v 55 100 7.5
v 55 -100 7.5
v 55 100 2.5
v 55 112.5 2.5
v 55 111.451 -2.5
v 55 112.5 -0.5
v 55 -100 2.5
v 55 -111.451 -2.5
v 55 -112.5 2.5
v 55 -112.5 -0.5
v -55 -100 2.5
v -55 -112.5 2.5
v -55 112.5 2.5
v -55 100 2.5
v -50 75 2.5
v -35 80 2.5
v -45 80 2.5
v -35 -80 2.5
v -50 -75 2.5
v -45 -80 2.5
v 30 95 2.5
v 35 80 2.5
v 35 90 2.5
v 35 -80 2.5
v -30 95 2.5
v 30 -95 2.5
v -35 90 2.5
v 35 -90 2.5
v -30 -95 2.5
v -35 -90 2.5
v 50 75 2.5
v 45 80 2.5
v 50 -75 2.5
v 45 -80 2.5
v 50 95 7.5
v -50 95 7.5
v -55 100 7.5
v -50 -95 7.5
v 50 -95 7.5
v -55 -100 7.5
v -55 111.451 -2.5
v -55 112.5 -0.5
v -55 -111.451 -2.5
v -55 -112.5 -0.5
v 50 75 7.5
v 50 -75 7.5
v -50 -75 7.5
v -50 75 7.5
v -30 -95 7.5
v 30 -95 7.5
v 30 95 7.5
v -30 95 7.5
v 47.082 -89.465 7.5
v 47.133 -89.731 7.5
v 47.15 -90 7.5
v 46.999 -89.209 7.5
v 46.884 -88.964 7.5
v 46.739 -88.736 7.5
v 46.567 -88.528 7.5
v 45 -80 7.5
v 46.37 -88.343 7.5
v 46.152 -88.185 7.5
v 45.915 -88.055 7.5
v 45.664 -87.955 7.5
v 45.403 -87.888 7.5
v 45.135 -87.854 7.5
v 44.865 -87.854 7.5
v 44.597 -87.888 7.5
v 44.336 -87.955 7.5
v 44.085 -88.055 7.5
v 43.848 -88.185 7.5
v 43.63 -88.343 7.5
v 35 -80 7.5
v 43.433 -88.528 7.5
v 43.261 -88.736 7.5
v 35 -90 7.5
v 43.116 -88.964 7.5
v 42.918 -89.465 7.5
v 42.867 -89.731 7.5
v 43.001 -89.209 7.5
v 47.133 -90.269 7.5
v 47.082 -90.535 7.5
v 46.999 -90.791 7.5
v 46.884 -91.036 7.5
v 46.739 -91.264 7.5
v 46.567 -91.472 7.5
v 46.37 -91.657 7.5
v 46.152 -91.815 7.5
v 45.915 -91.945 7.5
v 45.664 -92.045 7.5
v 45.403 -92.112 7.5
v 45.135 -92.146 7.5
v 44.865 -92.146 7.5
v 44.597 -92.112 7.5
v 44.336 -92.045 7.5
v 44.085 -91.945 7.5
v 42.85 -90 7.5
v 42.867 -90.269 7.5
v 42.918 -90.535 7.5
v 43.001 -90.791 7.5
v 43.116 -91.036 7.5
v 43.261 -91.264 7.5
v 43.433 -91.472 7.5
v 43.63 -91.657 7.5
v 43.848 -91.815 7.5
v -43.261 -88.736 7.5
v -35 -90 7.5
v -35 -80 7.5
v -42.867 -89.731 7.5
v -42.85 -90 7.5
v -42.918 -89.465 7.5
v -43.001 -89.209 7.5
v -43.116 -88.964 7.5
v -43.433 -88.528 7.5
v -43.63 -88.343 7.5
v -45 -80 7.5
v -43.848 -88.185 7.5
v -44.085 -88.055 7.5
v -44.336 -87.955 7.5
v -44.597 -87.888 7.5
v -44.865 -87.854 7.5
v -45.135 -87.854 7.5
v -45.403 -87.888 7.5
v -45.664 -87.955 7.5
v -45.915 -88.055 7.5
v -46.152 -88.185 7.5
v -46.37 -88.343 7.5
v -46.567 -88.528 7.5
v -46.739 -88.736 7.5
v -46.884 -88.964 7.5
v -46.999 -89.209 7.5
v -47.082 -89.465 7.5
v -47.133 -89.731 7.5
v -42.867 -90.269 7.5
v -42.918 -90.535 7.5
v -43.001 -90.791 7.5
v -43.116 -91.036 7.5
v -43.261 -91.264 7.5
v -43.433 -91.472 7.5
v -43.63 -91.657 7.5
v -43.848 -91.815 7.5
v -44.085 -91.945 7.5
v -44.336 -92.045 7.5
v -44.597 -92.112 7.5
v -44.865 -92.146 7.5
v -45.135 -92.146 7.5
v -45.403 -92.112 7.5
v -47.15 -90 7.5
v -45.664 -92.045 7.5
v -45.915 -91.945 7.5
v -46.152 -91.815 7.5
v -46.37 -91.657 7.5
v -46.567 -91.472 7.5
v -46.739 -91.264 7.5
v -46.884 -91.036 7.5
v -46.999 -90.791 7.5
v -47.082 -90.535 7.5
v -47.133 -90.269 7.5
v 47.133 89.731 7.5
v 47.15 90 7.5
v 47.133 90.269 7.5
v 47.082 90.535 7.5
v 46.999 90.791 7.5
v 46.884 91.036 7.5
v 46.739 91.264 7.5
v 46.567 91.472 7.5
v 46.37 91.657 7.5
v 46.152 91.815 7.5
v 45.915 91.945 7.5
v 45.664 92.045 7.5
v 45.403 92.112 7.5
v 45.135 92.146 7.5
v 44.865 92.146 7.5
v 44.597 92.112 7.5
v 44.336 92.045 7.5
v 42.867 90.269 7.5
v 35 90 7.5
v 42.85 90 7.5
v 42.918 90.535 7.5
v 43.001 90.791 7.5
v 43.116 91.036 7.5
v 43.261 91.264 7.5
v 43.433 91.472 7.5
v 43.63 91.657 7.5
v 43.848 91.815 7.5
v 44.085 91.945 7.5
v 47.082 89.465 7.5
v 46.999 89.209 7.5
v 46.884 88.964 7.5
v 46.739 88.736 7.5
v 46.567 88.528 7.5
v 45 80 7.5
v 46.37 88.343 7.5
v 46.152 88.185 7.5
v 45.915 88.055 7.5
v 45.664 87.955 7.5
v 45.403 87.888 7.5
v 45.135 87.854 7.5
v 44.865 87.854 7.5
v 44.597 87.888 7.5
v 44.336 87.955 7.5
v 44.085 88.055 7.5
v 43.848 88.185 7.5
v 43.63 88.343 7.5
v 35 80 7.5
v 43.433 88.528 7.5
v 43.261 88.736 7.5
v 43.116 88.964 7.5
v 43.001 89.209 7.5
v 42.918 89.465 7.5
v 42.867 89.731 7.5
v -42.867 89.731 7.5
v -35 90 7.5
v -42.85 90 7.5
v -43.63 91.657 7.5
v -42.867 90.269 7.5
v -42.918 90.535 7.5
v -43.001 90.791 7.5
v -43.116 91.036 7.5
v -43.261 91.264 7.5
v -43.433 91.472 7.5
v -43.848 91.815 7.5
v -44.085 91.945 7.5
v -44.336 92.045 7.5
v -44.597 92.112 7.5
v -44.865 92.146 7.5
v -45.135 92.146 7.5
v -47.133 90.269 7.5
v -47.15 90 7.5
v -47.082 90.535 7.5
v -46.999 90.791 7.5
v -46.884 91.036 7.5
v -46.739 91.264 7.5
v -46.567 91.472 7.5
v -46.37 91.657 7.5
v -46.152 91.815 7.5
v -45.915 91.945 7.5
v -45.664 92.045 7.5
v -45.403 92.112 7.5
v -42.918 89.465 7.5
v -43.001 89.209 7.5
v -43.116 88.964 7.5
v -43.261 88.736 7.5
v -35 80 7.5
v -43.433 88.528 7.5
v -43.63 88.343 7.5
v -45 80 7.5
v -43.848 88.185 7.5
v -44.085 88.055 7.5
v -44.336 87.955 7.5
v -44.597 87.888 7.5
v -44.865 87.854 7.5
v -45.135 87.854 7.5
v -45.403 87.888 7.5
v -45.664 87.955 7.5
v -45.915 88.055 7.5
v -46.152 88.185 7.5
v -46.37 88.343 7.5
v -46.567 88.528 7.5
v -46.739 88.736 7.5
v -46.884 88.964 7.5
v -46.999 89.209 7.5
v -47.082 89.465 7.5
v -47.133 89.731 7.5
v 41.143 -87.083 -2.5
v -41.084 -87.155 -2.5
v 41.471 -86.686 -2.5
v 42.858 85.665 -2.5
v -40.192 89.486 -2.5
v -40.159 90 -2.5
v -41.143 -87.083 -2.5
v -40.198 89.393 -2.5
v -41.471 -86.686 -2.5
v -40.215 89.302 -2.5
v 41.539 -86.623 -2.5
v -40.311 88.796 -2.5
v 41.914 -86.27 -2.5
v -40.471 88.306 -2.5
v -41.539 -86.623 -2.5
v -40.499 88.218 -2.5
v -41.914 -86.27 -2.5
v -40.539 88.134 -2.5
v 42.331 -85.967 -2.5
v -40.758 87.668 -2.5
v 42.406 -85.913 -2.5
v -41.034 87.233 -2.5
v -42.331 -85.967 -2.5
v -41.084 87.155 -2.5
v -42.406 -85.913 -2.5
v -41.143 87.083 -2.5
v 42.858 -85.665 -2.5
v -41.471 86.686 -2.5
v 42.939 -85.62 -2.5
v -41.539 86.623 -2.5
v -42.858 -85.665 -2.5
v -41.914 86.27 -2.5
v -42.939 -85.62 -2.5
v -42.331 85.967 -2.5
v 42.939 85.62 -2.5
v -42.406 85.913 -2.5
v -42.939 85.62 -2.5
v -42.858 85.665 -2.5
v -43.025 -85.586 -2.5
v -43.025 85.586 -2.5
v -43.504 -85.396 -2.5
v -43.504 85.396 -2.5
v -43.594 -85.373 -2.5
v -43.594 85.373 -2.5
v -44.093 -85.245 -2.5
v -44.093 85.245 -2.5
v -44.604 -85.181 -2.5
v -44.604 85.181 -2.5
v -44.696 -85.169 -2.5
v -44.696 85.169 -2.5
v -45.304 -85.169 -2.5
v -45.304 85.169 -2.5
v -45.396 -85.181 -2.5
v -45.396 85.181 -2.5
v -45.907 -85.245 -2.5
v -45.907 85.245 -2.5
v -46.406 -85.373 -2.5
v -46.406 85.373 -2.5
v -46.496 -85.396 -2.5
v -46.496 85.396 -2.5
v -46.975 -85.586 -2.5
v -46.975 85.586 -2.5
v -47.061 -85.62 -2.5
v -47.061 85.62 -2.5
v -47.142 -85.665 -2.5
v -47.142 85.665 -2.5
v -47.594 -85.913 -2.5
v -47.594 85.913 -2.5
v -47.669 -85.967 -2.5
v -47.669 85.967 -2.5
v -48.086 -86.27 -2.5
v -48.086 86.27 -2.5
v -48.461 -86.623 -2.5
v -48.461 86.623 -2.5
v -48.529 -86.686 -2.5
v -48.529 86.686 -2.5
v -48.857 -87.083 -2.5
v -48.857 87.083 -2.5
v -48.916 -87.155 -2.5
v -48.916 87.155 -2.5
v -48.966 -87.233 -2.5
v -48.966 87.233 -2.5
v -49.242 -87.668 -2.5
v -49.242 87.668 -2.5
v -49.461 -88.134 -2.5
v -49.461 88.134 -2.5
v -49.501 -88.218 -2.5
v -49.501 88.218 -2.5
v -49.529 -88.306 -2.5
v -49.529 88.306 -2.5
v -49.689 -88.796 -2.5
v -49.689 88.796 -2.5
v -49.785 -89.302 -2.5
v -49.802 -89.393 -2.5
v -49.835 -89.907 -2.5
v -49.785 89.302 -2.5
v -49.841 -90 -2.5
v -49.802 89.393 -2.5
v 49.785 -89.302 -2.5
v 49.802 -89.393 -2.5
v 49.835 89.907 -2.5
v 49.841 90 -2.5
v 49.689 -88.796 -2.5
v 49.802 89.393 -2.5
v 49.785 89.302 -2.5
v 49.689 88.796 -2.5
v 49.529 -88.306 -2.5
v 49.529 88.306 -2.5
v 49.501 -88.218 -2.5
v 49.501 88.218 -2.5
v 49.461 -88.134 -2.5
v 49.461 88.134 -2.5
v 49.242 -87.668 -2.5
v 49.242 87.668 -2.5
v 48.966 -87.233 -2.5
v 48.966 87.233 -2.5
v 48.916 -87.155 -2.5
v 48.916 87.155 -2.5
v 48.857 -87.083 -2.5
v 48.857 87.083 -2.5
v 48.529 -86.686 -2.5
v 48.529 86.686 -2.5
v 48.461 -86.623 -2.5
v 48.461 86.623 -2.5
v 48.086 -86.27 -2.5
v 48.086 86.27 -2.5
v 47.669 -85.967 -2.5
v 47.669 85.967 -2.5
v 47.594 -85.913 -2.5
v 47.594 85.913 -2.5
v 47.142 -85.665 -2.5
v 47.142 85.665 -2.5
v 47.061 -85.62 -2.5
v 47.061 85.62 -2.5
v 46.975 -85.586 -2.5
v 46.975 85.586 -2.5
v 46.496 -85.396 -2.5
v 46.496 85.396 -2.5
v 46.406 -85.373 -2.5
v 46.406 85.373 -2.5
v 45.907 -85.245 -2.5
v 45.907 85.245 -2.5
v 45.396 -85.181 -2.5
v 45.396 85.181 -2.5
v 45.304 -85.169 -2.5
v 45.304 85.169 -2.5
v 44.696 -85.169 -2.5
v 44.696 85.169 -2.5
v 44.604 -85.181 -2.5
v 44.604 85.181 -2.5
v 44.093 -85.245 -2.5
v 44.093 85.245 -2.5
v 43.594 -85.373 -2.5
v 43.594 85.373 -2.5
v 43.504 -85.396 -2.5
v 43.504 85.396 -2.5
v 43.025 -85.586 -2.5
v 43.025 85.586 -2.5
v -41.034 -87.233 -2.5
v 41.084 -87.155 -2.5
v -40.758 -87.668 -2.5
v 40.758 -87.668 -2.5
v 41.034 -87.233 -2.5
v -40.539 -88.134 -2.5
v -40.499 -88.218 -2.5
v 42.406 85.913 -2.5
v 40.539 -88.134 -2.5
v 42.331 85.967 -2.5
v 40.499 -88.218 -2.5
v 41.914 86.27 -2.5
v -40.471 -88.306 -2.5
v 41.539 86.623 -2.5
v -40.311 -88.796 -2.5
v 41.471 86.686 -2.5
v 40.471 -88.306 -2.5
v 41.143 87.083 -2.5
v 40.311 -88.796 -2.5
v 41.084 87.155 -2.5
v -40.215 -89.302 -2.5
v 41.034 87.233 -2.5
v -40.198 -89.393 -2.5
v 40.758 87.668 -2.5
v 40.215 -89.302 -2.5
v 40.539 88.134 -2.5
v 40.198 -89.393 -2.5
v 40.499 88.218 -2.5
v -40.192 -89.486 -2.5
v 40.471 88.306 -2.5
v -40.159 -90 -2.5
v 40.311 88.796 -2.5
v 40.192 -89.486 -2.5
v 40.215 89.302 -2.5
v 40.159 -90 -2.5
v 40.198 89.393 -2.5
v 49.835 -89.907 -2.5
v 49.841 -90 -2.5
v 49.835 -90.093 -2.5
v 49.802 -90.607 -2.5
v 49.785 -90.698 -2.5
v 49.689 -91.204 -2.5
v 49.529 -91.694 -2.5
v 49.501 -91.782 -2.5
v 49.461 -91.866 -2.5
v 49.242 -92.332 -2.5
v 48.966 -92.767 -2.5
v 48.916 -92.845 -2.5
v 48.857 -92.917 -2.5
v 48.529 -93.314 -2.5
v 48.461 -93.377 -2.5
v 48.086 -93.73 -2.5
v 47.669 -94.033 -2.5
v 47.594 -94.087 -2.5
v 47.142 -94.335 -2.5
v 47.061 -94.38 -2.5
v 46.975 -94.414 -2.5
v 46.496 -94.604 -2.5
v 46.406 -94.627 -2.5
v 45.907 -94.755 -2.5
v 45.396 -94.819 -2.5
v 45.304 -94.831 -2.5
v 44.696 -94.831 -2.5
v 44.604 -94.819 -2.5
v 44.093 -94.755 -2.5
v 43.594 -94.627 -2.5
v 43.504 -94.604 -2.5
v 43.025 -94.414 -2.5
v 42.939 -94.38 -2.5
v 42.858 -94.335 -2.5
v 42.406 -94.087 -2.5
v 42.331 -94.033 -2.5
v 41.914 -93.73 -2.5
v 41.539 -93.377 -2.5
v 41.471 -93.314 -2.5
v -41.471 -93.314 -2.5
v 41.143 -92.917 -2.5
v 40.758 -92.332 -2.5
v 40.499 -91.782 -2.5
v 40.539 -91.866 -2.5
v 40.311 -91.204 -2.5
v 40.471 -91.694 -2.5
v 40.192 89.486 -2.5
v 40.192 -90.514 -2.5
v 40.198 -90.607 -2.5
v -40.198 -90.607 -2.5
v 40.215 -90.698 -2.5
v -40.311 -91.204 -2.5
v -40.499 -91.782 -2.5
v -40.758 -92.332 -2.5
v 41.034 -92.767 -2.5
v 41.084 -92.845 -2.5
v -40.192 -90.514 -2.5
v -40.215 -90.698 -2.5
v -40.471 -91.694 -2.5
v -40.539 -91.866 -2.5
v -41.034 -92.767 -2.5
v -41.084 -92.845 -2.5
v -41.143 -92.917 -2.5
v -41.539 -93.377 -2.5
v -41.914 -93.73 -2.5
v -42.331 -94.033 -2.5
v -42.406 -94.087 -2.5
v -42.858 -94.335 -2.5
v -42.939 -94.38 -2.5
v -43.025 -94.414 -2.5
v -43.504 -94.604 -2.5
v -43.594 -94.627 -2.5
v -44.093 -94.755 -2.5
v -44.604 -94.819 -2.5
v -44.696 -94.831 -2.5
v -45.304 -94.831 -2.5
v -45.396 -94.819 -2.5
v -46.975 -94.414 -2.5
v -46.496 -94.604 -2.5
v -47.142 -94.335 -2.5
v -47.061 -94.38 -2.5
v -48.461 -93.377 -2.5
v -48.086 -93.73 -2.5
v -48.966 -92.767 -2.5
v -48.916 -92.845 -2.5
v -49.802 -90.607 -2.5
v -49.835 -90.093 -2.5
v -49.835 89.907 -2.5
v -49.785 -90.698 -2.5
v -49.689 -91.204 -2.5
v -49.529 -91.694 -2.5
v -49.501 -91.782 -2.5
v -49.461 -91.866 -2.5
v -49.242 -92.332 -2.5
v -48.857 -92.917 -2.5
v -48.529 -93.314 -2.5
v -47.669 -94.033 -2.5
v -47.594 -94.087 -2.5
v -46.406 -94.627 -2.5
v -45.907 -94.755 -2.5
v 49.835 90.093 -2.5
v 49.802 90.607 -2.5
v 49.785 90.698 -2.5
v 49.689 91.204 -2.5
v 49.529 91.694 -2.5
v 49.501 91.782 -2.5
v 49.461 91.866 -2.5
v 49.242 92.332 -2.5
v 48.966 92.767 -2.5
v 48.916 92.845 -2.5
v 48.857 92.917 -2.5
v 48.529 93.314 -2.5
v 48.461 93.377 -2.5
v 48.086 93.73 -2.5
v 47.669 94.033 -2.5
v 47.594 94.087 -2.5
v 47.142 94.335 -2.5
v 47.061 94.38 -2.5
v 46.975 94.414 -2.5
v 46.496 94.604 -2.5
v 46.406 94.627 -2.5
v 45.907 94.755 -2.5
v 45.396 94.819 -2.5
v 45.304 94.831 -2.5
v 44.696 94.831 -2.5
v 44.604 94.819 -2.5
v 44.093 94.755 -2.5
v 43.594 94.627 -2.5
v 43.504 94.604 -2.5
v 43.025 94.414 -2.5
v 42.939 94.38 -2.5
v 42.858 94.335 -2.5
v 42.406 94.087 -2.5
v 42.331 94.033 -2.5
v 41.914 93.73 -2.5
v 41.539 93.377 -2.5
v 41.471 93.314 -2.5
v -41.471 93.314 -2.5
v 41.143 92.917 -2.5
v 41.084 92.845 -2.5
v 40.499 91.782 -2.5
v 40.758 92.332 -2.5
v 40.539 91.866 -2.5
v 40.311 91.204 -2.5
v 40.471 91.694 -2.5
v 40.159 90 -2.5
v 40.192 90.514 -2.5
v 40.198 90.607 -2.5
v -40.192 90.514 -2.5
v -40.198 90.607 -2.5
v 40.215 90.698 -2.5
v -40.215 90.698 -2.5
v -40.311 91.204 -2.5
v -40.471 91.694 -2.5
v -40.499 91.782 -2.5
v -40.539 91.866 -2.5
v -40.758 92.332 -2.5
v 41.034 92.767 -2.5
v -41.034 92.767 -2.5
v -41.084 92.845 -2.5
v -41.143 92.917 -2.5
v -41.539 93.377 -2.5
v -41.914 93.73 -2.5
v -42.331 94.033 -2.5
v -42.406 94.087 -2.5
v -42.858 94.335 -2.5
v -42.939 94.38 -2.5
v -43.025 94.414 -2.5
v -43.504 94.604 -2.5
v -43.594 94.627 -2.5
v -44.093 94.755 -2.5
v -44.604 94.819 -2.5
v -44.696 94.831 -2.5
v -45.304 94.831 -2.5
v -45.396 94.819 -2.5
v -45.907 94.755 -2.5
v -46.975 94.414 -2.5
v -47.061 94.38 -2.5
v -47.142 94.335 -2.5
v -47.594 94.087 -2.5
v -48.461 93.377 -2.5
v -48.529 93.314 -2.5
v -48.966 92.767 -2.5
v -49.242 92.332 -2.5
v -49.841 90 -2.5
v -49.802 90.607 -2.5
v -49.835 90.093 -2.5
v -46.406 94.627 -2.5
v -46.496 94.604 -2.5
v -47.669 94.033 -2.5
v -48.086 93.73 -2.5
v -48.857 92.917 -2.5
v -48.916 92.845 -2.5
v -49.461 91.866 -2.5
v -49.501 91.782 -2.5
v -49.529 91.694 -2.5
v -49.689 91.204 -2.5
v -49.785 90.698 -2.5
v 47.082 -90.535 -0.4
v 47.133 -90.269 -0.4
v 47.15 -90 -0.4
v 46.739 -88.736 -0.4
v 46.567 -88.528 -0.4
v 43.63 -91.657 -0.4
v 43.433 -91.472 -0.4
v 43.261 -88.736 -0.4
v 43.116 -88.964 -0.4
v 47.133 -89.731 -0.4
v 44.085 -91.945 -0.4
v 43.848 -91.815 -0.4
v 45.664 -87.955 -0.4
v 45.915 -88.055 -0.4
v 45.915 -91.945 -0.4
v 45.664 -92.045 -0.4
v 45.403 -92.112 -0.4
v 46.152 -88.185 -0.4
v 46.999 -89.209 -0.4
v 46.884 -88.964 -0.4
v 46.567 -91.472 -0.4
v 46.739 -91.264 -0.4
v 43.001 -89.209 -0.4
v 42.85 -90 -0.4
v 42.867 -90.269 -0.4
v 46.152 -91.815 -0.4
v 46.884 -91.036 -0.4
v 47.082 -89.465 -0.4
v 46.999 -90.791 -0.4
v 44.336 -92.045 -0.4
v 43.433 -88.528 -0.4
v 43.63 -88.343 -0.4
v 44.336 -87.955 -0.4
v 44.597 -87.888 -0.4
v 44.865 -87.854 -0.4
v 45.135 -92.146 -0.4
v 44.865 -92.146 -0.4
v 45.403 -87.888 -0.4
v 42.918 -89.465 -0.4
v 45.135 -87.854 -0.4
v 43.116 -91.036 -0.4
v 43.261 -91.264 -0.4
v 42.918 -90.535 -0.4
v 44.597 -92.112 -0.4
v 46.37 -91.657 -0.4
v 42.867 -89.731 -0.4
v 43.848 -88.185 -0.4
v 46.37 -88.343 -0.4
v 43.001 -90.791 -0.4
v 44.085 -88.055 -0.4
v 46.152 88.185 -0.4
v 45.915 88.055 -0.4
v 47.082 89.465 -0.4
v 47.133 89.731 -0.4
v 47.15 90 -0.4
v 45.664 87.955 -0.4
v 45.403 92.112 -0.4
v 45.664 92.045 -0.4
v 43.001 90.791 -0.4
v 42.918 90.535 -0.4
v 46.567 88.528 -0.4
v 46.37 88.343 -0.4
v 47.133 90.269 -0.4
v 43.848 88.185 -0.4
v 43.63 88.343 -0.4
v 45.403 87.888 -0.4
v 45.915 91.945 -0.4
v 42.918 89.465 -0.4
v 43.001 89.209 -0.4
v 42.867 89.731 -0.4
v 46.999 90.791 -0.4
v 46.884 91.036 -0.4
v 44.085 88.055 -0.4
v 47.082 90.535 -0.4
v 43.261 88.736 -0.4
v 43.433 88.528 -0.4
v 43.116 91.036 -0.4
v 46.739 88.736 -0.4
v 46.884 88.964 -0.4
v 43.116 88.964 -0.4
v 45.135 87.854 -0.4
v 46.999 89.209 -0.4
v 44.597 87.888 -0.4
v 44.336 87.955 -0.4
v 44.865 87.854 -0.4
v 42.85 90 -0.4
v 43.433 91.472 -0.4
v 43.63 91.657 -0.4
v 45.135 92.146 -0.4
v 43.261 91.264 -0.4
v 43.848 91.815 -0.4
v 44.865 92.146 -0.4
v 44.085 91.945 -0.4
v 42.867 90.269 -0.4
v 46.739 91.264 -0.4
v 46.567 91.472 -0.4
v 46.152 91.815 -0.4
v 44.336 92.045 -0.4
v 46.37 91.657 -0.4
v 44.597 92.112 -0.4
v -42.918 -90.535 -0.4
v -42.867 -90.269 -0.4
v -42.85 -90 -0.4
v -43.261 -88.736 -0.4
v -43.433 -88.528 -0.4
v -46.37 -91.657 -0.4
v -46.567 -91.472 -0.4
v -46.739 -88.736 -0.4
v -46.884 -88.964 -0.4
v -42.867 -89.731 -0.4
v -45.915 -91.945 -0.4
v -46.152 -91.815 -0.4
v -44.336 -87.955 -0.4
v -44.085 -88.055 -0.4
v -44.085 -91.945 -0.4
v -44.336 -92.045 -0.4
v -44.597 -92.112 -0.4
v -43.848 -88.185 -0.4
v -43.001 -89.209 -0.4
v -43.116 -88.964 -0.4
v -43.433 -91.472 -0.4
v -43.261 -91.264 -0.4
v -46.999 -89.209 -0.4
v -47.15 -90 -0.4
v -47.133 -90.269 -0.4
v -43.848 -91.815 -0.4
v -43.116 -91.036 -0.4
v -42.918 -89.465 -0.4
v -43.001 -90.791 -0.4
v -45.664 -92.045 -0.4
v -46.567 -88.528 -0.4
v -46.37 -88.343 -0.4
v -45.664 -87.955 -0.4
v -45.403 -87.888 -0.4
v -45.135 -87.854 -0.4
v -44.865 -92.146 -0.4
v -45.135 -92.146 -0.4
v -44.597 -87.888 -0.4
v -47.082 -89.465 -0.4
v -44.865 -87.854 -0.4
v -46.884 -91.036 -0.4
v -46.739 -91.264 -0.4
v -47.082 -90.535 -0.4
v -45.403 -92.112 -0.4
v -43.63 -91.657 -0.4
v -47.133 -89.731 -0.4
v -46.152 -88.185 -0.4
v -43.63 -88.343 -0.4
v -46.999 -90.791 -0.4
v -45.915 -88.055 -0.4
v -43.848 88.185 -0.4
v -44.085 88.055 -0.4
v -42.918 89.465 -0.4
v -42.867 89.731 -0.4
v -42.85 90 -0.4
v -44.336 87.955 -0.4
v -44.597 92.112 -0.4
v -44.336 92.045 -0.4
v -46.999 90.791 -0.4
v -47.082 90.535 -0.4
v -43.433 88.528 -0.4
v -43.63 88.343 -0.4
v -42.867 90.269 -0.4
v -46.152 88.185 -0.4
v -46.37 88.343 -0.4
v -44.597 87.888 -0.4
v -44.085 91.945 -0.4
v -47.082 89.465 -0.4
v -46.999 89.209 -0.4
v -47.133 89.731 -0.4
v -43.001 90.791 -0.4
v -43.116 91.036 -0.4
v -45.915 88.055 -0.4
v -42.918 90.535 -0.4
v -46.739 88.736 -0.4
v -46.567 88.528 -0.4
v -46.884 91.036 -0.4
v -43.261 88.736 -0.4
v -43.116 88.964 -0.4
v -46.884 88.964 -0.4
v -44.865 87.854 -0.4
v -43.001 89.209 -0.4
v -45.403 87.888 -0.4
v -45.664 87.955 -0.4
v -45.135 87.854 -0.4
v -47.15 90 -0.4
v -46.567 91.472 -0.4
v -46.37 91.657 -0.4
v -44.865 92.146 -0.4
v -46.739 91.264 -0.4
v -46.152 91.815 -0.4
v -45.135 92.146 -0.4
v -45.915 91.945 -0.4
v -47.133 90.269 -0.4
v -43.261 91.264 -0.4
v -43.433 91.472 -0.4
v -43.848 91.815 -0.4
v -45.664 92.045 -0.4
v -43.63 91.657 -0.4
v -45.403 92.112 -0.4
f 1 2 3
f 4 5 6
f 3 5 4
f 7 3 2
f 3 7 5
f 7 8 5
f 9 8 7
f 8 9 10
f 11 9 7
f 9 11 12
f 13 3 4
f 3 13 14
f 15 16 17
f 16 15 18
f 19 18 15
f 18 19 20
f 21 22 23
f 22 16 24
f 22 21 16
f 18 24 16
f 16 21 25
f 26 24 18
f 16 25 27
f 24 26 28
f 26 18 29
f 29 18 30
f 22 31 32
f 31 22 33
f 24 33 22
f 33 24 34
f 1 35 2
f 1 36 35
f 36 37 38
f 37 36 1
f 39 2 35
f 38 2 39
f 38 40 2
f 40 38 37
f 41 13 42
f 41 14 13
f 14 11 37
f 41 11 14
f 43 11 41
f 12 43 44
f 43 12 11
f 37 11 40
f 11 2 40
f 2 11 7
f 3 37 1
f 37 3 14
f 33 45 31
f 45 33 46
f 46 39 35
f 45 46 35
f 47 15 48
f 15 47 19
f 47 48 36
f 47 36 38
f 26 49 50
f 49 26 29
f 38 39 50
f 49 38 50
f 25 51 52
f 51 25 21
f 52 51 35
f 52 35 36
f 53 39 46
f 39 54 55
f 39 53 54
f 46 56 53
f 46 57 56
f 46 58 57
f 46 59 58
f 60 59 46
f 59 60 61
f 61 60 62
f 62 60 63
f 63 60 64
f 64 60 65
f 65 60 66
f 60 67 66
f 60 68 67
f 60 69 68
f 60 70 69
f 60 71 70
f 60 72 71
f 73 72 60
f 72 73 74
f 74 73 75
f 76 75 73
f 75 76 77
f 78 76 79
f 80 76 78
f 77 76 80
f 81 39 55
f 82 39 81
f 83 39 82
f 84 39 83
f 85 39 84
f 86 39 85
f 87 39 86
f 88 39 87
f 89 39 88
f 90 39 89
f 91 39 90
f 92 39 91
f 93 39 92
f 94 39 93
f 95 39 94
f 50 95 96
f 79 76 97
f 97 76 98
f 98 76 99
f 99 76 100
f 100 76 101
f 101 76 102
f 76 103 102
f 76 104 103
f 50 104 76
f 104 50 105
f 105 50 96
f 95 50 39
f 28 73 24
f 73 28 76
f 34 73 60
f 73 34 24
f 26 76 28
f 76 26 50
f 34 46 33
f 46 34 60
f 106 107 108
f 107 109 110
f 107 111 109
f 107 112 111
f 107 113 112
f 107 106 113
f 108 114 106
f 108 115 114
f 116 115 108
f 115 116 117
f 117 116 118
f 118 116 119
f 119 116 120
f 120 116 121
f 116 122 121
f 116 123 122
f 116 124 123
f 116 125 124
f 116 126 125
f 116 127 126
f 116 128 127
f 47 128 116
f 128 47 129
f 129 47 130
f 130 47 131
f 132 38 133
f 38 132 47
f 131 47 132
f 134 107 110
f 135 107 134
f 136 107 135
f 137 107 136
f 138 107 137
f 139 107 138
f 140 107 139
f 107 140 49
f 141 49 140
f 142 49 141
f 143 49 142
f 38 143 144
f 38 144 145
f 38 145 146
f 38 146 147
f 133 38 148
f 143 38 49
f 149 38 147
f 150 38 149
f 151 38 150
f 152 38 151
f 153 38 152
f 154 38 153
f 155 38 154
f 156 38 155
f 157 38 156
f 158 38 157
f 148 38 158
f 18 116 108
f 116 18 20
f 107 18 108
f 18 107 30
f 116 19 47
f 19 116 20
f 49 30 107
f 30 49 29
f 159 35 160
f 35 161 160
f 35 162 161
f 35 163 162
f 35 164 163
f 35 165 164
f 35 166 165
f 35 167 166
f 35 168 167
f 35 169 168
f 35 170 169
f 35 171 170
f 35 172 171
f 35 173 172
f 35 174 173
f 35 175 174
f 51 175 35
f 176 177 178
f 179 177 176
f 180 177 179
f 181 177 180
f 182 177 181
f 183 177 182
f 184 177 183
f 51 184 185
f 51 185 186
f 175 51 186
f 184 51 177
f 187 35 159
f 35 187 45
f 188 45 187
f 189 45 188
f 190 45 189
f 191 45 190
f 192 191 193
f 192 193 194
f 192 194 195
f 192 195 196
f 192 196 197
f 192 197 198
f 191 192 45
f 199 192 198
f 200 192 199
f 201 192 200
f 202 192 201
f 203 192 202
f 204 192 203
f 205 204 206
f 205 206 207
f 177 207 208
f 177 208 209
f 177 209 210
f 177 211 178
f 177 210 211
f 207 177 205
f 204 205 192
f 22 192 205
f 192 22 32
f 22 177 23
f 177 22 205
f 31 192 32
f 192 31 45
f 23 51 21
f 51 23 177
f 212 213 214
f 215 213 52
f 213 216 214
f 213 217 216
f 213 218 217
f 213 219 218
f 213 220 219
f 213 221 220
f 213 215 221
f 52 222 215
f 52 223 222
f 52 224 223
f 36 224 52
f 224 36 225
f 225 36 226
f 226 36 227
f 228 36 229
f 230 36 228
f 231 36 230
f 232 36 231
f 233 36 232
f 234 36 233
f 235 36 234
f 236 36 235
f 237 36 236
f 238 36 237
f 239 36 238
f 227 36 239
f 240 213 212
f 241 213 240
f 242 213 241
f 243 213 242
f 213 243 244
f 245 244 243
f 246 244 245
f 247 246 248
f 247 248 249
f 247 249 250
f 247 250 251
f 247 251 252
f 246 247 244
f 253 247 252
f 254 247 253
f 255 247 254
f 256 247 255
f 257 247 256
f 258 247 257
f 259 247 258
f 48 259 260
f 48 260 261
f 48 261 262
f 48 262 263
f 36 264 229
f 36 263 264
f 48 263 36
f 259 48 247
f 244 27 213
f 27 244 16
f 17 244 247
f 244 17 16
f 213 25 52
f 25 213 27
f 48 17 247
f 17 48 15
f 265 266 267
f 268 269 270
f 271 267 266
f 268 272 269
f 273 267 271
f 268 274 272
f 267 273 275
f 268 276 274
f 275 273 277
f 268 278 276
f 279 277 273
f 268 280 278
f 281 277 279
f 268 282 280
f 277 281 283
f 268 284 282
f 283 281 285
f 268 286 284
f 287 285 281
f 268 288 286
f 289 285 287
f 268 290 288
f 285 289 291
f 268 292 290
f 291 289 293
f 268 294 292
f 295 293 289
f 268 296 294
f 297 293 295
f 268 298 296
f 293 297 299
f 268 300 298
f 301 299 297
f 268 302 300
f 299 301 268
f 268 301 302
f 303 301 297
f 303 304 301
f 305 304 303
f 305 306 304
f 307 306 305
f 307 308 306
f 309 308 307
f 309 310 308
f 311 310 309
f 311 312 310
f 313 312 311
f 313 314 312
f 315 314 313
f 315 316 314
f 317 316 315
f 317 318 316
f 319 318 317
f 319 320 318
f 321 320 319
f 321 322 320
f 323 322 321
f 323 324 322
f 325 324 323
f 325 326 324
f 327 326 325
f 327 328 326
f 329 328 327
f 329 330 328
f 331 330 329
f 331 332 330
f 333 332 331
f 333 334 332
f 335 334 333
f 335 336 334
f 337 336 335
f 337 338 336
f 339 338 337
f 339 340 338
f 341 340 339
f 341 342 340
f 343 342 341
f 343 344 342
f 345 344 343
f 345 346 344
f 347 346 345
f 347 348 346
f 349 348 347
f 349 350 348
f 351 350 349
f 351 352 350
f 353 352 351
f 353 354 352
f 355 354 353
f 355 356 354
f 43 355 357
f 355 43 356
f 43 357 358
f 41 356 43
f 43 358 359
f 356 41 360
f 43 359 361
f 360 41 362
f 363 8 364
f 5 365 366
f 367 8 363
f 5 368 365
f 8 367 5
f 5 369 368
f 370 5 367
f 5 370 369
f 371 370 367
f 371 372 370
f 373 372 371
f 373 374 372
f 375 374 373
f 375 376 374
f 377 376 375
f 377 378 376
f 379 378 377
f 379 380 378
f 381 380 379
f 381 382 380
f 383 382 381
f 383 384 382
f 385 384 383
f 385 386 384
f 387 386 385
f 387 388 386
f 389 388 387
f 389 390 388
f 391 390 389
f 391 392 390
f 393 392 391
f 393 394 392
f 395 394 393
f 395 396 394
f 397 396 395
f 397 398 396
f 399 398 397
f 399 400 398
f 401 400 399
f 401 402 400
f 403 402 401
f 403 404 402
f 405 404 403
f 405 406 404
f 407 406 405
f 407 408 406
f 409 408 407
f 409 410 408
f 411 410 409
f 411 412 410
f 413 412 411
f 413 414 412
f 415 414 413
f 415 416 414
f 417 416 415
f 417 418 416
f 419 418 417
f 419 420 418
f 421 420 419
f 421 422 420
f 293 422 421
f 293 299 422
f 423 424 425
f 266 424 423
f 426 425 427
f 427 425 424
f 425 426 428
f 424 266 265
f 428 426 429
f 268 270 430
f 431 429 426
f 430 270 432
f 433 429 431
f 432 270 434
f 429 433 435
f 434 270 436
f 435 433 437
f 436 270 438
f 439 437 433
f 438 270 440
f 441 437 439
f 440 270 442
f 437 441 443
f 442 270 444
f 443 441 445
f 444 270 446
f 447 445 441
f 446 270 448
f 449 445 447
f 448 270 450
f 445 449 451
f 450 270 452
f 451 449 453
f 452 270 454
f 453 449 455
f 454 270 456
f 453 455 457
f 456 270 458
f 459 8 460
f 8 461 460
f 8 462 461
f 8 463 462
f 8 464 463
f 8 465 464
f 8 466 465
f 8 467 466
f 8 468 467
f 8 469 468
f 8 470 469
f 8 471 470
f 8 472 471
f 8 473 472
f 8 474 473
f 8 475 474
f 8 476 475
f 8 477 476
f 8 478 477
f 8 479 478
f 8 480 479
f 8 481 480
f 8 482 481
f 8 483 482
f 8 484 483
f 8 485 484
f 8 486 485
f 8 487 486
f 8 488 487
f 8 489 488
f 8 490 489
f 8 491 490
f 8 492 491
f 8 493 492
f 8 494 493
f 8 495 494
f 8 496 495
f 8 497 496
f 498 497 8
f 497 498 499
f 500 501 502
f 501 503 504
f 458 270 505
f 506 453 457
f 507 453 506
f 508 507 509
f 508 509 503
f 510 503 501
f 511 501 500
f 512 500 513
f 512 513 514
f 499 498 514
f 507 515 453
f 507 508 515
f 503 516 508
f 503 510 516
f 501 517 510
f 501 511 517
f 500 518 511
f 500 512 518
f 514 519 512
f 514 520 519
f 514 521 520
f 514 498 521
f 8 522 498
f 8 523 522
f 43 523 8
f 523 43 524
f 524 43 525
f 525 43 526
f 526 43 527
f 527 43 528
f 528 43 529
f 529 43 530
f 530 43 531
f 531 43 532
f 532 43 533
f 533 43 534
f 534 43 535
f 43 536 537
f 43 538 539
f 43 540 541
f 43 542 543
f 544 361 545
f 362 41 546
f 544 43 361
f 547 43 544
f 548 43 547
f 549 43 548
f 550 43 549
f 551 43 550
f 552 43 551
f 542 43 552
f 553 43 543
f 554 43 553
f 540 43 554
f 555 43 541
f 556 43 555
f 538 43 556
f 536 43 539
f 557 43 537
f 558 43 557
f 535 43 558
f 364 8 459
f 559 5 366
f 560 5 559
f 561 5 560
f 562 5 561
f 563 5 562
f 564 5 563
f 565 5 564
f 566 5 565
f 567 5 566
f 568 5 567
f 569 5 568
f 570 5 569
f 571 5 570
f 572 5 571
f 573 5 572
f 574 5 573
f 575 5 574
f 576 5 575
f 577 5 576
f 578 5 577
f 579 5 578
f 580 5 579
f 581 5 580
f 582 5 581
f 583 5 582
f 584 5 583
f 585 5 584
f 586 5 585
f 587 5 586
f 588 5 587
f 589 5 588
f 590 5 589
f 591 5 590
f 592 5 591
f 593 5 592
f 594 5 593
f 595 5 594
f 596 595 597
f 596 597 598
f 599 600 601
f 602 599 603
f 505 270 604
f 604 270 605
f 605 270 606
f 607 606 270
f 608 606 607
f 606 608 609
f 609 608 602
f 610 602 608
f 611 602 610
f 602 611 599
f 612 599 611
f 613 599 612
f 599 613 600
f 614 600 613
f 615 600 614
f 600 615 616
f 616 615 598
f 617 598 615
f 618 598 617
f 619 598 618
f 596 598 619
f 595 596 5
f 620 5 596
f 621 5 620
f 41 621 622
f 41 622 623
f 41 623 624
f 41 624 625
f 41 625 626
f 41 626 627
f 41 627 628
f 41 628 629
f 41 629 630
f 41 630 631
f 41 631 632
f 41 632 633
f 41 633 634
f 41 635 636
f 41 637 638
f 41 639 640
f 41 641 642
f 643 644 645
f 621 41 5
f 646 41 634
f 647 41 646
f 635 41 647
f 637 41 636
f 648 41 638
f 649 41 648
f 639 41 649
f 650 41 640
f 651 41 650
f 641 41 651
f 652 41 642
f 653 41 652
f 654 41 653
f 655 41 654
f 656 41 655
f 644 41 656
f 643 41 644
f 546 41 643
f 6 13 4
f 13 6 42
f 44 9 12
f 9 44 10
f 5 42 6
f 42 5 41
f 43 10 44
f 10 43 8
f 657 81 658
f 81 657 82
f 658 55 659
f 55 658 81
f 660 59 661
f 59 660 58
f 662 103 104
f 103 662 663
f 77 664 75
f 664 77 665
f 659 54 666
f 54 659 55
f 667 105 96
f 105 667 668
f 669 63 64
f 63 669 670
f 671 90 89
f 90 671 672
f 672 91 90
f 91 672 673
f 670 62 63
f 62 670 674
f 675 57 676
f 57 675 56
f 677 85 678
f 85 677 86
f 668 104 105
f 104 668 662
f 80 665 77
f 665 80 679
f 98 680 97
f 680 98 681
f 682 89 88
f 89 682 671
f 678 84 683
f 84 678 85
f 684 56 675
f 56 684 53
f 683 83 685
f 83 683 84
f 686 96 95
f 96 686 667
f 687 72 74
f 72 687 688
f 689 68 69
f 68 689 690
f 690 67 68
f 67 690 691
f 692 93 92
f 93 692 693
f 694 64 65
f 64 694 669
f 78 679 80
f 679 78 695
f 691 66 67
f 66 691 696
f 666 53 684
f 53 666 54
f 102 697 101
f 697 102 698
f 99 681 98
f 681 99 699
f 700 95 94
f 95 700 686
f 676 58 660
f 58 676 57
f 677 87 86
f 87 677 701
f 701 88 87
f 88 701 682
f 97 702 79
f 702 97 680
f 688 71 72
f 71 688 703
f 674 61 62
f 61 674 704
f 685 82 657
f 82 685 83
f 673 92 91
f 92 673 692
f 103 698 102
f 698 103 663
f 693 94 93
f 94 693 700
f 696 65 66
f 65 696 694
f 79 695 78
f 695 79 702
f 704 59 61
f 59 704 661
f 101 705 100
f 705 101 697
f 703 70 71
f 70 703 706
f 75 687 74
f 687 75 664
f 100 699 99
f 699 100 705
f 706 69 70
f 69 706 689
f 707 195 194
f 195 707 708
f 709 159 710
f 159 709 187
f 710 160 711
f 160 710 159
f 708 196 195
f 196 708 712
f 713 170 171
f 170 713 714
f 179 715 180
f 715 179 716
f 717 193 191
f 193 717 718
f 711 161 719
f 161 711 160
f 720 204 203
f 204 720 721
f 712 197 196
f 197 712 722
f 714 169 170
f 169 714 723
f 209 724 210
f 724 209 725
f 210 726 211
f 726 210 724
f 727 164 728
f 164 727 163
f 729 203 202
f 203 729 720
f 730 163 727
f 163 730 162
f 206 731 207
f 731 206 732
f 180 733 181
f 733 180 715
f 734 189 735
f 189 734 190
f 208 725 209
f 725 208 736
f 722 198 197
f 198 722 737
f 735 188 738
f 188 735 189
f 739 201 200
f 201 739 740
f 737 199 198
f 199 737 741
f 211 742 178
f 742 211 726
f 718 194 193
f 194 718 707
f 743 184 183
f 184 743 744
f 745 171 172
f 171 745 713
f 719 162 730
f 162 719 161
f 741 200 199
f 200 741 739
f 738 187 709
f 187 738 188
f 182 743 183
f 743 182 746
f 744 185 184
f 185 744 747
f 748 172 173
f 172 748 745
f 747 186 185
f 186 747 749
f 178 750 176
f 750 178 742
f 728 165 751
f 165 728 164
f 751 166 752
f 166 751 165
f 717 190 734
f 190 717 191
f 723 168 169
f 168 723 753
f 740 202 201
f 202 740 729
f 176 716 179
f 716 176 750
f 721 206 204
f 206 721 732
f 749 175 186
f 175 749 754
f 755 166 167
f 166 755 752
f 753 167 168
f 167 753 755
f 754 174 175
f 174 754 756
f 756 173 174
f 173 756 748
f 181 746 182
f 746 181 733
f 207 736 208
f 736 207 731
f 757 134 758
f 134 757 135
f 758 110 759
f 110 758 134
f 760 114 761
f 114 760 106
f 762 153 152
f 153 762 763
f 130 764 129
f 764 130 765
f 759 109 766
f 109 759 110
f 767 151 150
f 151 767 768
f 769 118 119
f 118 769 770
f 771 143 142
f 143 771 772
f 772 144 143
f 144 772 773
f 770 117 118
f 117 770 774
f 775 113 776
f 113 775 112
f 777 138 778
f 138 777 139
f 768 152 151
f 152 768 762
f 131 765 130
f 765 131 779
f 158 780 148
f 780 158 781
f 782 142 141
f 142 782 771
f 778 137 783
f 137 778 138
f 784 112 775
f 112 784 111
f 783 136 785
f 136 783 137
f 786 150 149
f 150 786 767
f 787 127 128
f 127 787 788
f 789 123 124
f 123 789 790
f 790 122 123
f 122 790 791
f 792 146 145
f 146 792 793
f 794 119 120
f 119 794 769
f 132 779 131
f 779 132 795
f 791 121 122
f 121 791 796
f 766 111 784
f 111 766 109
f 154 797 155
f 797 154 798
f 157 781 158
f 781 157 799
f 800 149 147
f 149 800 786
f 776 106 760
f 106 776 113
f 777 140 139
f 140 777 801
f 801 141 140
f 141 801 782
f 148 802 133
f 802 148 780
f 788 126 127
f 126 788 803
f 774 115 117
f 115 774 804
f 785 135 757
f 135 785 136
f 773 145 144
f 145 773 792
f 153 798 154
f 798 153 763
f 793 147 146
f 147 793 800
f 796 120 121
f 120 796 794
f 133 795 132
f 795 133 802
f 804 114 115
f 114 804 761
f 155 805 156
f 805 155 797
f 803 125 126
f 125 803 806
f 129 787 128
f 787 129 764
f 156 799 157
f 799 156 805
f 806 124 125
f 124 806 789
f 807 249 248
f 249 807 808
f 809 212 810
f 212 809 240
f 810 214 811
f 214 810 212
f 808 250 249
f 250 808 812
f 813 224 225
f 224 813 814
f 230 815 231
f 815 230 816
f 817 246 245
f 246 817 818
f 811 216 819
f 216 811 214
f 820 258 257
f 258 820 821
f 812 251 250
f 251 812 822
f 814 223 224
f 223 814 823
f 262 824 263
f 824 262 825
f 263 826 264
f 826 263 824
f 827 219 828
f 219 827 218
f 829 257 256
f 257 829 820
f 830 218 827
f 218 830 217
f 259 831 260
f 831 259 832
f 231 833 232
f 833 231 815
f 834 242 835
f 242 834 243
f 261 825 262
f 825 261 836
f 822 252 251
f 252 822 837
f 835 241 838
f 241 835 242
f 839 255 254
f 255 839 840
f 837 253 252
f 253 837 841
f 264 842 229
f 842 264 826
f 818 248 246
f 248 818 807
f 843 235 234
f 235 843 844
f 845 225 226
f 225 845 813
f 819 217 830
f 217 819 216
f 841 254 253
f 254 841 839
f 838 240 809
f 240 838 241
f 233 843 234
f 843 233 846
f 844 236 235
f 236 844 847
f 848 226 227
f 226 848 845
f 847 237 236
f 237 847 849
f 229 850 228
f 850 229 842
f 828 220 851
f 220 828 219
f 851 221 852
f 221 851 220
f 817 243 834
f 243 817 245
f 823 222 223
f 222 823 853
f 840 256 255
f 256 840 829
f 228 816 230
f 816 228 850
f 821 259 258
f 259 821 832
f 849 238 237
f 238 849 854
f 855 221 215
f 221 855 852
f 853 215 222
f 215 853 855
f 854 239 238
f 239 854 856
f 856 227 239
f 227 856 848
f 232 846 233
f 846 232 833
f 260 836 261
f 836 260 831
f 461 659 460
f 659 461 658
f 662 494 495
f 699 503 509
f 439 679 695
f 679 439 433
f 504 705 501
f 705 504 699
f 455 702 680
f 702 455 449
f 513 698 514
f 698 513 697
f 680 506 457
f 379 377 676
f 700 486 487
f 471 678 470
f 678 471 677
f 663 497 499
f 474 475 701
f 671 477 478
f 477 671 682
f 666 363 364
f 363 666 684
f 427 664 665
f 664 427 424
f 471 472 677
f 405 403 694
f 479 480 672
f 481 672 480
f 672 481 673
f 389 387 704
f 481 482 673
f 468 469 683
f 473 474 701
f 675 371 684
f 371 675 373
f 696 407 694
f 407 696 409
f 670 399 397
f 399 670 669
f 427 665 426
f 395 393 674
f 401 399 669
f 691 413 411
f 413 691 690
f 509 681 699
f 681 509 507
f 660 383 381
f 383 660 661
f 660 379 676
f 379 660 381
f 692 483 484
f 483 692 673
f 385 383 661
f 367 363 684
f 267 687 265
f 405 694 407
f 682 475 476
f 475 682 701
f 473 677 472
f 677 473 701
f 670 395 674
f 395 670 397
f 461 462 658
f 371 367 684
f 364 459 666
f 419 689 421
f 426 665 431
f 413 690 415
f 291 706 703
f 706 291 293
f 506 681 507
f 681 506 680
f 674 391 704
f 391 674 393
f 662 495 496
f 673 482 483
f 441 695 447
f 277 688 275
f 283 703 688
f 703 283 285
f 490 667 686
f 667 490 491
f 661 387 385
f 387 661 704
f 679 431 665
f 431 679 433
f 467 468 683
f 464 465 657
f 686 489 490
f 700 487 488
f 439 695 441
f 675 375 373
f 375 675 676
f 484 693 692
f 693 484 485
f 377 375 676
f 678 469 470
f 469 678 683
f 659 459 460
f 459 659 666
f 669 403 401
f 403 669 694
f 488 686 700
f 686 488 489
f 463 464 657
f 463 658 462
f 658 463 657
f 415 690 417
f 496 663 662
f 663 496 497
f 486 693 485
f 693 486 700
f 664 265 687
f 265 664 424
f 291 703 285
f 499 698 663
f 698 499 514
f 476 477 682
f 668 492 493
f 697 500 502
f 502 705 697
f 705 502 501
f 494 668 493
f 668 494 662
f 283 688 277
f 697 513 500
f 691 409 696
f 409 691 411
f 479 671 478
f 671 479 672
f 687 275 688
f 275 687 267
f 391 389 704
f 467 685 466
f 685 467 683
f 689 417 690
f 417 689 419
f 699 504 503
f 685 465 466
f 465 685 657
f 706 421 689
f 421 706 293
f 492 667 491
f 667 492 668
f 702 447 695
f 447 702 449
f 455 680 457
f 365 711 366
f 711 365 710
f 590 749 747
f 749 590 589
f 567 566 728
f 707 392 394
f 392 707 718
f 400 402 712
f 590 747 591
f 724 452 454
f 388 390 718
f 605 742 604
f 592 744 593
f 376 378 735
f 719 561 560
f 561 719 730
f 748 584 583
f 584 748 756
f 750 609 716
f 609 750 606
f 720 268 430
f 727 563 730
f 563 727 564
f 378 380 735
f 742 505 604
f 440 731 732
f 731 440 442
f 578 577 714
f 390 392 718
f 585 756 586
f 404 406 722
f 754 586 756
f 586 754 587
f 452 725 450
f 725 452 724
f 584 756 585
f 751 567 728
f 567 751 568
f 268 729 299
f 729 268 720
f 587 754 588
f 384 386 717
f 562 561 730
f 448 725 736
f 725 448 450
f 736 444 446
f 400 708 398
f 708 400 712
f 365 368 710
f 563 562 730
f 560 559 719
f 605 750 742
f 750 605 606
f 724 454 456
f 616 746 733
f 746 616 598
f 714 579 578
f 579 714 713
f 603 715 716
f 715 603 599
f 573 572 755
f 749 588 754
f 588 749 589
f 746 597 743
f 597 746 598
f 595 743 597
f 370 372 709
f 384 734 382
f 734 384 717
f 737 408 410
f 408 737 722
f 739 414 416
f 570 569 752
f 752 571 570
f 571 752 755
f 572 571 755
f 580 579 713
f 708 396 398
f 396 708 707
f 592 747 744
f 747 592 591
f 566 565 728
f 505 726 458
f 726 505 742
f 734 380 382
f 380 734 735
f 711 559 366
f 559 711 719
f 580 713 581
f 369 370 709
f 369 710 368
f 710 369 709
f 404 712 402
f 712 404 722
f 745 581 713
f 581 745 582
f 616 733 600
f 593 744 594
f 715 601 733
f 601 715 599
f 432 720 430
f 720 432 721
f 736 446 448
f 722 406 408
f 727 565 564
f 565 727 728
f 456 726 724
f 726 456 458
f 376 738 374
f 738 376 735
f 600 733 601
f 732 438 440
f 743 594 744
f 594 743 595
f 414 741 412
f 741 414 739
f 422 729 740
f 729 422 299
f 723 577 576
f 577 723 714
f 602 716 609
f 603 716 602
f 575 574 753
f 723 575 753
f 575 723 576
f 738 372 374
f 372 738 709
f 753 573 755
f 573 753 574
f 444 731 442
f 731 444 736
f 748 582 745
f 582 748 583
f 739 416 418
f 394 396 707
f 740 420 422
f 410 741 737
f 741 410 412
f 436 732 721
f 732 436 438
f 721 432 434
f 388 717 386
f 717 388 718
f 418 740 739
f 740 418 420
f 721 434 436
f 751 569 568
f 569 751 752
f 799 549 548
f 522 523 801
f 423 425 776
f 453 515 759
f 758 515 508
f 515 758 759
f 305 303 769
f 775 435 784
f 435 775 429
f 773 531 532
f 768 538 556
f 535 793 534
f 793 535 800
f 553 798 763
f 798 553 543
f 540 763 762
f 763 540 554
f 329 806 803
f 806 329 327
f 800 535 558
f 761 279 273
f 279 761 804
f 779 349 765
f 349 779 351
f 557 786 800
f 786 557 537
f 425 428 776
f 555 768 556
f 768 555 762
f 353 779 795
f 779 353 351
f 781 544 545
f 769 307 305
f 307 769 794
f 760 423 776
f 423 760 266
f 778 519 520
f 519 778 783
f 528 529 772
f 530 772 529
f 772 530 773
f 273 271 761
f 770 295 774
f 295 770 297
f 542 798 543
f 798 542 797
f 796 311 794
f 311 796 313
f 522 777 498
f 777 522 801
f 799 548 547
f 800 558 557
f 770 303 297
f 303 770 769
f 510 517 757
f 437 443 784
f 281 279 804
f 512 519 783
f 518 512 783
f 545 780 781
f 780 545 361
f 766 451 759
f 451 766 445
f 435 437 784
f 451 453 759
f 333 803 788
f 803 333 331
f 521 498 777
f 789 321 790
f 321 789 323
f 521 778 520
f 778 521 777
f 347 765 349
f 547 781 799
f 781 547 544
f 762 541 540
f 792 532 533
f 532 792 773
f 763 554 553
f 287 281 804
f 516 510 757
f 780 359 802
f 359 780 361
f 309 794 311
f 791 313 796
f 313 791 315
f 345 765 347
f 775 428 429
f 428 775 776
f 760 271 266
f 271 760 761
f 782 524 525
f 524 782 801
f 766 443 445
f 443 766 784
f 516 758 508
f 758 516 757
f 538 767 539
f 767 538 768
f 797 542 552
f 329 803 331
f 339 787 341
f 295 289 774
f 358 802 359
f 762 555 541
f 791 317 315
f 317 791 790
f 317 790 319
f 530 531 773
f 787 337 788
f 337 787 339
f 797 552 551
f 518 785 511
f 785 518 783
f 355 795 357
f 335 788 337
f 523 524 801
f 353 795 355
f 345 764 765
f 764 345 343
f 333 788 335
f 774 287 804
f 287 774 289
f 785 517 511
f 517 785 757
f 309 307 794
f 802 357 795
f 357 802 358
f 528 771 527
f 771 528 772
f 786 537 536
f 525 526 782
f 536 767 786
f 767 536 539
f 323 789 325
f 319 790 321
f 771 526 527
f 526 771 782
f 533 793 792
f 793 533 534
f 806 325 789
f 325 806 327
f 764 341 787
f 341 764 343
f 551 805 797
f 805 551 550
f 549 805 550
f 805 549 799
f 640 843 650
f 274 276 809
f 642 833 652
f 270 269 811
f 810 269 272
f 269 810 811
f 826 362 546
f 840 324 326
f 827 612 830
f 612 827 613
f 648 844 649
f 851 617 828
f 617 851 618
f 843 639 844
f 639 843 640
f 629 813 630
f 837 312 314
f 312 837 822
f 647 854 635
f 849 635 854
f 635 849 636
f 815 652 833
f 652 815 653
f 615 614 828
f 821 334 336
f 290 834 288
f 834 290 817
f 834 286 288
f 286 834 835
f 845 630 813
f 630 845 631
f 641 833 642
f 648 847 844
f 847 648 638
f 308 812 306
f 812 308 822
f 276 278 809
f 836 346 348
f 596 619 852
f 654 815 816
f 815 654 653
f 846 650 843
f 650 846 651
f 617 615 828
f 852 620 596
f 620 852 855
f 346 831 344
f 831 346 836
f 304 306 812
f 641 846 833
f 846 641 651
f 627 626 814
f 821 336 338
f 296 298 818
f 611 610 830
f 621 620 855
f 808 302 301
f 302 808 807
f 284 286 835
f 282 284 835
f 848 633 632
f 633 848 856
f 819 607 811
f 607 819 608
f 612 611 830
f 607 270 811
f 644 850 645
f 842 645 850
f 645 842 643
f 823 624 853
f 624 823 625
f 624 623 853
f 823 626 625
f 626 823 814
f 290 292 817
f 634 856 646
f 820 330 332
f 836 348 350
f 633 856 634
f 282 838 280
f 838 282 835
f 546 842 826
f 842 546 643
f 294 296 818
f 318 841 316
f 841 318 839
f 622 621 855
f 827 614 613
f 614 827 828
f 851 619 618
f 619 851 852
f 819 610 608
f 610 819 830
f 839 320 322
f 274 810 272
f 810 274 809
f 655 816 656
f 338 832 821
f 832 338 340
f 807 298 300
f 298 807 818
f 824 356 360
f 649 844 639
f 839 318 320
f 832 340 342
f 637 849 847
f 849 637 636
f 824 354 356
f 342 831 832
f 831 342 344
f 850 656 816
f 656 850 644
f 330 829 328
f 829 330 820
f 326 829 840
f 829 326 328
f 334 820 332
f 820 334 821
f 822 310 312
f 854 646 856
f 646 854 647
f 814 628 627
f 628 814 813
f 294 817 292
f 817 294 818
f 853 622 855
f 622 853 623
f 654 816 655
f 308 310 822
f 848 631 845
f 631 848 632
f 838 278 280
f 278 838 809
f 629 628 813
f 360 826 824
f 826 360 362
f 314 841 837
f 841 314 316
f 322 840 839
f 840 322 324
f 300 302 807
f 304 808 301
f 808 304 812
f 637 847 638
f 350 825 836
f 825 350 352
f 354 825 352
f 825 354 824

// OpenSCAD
// file: parameters.scad
/*
 * SPDX-FileCopyrightText: © 2023 Brian S. Stephan <bss@incorporeal.org>
 * SPDX-License-Identifier: GPL-3.0-or-later
 */

// adjustments
hole_tolerance = 0.15;

// M2
m2_screw_selftap_radius = 0.95;

// M3
m3_screw_selftap_radius = 1.3;

// M4
m4_bolt_radius = 2 + hole_tolerance;
m4_bolt_countersink_radius = 6.1 + hole_tolerance;
m4_bolt_hex_exterior_radius = 3.6 + hole_tolerance;

// 24mm button
small_button_radius = 12 + hole_tolerance;

// 30mm button
big_button_radius = 15 + hole_tolerance;

// JLF mount dimensions
lever_mount_x = 53;
lever_mount_y = 95;
lever_mount_z = 2;

// standard lever hole
lever_plate_hole = 12;


// case dimensions
// base frame box. reminder: top of inside (including mounts) is chopped by panel_z for plates
frame_x = 208;
frame_y = 208;
frame_z = 50;

// middle piece dimensions
mid_frame_x = 118;

/*
frame_x = 233;
frame_y = 208;
frame_z = 57;
*/



// degree to which the extended frame pieces stick out from the end of the frame
frame_extension_x = 25;
frame_extension_y = 25;

// this sinks the bottom and top of the frame inward a bit, and is used to math out two shapes
// when creating the frame box / overhang panel
frame_bevel_height = 2;
overhang_panel_bevel_height = 1;

frame_center_to_neutrik = 70;

// depth of the "lip" of the frame that the top plate sets into/supports the overhang
frame_wall = 4;

// width of the column in the frame corners to support the hex bolt
frame_mount_column_width = 20;

// per neutrik (mm)
neutrik_panel_thickness = 3;

// top plate, which can either be the whole plate ("inset") or the mounting frame for a plate that overhangs
panel_x = frame_x - (frame_wall * 2);
panel_y = frame_y - (frame_wall * 2);
panel_z = 5;
mid_panel_x = mid_frame_x - (frame_wall * 2);


// how much the top plate x/y is expanded to overhang the frame
// note that this is relative to the top plate (so the wall is added back)
panel_overhang_amount = 8.5;
overhang_panel_x = panel_x + (frame_wall * 2) + (panel_overhang_amount * 2);
overhang_panel_y = panel_y + (frame_wall * 2) + (panel_overhang_amount * 2);
// mid overhang
mid_overhang_panel_x = mid_panel_x + (frame_wall * 2) + (panel_overhang_amount * 2);


panel_to_frame_point_x = (panel_x/2)-10;
panel_to_frame_point_y = (panel_y/2)-10;
mid_panel_to_frame_point_x = (mid_panel_x/2)-10;


// frame interior that supports the top plates
panel_support_width = 5;

// neutrik D screw holes
neutrik_d_screw_radius = 1.6 + hole_tolerance;
neutrik_d_radius = 12 + hole_tolerance;

// additional button radius for decorative panels, etc.
decorative_radius_scale = 1.75;
jumbo_decorative_radius_scale = 2;
// main file
/*
 * SPDX-FileCopyrightText: © 2023 Brian S. Stephan <bss@incorporeal.org>
 * SPDX-License-Identifier: GPL-3.0-or-later
 */

include <parameters.scad>
include <components.scad>

module bottom_panel_middle_custom() {
	difference() {
		rotate([180, 0, 0]) middle_base_panel_with_raised_overhang();
		rotate([180, 0, 0]) mid_panel_holes();
        // chop the right edge off
		mid_side_chopper();
        rotate([0, 0, 180]) mid_side_chopper();

	}
}

bottom_panel_middle_custom();
